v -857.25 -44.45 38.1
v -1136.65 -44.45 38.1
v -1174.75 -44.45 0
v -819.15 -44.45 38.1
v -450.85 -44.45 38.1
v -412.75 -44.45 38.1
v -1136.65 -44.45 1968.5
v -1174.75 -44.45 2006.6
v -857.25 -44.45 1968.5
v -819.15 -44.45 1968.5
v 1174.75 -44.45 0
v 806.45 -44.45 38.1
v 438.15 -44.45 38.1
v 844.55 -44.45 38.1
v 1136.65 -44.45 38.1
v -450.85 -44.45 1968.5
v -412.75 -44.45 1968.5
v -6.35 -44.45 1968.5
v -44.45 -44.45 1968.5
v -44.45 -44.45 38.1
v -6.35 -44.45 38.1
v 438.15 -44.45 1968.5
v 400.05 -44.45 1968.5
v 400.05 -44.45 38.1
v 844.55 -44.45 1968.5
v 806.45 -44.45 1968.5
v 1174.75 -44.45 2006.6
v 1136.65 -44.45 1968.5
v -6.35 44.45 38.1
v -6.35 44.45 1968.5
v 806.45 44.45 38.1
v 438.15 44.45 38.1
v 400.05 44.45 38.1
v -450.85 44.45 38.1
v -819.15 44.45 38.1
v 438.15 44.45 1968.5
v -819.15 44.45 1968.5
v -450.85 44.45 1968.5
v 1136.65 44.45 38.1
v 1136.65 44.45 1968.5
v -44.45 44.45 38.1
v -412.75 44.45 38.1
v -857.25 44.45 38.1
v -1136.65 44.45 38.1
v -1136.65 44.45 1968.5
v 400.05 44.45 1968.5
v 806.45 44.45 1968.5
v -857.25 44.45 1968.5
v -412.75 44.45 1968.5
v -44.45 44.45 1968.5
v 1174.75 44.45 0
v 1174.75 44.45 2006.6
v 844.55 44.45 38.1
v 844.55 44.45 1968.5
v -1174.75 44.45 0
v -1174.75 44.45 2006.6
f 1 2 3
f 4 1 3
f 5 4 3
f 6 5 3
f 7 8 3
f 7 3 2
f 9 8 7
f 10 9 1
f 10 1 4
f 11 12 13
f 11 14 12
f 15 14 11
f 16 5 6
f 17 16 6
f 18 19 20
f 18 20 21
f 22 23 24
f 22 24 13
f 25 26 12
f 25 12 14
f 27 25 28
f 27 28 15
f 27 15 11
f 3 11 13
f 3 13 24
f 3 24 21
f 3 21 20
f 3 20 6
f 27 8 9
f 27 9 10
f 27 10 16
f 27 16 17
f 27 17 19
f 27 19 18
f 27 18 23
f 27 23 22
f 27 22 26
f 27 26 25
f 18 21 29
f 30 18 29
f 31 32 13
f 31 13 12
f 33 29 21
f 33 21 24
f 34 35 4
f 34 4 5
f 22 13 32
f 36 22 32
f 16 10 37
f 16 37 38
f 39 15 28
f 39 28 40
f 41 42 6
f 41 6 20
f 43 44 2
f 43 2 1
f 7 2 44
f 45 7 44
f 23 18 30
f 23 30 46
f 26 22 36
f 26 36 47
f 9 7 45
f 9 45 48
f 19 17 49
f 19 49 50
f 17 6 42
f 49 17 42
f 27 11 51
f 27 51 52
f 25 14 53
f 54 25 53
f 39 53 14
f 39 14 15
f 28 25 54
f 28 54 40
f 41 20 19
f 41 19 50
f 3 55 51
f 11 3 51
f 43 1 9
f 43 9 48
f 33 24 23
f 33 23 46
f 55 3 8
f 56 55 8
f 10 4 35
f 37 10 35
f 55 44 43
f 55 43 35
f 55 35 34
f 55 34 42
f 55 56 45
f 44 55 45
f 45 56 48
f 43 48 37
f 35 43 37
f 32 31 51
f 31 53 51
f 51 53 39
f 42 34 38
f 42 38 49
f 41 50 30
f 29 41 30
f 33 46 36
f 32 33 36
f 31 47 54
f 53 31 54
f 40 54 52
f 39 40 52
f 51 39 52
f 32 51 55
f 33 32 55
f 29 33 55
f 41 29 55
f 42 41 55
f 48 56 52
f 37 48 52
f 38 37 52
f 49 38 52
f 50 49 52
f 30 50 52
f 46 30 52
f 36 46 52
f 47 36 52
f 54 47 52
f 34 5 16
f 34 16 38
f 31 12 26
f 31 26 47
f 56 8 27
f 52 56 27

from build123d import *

# Parameters (mm, degrees)
F0_W     = 2349.5
F0_H     = 88.9
F1_DEPTH = 38.1
F2_W     = 38.1
F2_H     = 88.9
F3_DEPTH = 1930.4
F4_W     = 2349.5
F4_H     = 38.1
F5_DEPTH = 88.9


with BuildPart() as f1:
    # F0 (on Top) → F1 (new body)
    with BuildSketch(Plane.XY):
        Rectangle(F0_W, F0_H)
    extrude(amount=F1_DEPTH)

    # F2 (on face) → F3 (join)
    with BuildSketch(Plane.XY.offset(38.1)):
        with Locations((-1155.7, 0)):
            Rectangle(F2_W, F2_H)
        with Locations((-838.2, 0)):
            Rectangle(F2_W, F2_H)
        with Locations((-431.8, 0)):
            Rectangle(F2_W, F2_H)
        with Locations((-25.4, 0)):
            Rectangle(F2_W, F2_H)
        with Locations((419.1, 0)):
            Rectangle(F2_W, F2_H)
        with Locations((825.5, 0)):
            Rectangle(F2_W, F2_H)
        with Locations((1155.7, 0)):
            Rectangle(F2_W, F2_H)
    extrude(amount=F3_DEPTH)

    # F4 (on face) → F5 (join)
    with BuildSketch(Plane.XZ.offset(44.45)):
        with Locations((0, 1987.55)):
            Rectangle(F4_W, F4_H)
    extrude(amount=-F5_DEPTH)


solid = f1.part
